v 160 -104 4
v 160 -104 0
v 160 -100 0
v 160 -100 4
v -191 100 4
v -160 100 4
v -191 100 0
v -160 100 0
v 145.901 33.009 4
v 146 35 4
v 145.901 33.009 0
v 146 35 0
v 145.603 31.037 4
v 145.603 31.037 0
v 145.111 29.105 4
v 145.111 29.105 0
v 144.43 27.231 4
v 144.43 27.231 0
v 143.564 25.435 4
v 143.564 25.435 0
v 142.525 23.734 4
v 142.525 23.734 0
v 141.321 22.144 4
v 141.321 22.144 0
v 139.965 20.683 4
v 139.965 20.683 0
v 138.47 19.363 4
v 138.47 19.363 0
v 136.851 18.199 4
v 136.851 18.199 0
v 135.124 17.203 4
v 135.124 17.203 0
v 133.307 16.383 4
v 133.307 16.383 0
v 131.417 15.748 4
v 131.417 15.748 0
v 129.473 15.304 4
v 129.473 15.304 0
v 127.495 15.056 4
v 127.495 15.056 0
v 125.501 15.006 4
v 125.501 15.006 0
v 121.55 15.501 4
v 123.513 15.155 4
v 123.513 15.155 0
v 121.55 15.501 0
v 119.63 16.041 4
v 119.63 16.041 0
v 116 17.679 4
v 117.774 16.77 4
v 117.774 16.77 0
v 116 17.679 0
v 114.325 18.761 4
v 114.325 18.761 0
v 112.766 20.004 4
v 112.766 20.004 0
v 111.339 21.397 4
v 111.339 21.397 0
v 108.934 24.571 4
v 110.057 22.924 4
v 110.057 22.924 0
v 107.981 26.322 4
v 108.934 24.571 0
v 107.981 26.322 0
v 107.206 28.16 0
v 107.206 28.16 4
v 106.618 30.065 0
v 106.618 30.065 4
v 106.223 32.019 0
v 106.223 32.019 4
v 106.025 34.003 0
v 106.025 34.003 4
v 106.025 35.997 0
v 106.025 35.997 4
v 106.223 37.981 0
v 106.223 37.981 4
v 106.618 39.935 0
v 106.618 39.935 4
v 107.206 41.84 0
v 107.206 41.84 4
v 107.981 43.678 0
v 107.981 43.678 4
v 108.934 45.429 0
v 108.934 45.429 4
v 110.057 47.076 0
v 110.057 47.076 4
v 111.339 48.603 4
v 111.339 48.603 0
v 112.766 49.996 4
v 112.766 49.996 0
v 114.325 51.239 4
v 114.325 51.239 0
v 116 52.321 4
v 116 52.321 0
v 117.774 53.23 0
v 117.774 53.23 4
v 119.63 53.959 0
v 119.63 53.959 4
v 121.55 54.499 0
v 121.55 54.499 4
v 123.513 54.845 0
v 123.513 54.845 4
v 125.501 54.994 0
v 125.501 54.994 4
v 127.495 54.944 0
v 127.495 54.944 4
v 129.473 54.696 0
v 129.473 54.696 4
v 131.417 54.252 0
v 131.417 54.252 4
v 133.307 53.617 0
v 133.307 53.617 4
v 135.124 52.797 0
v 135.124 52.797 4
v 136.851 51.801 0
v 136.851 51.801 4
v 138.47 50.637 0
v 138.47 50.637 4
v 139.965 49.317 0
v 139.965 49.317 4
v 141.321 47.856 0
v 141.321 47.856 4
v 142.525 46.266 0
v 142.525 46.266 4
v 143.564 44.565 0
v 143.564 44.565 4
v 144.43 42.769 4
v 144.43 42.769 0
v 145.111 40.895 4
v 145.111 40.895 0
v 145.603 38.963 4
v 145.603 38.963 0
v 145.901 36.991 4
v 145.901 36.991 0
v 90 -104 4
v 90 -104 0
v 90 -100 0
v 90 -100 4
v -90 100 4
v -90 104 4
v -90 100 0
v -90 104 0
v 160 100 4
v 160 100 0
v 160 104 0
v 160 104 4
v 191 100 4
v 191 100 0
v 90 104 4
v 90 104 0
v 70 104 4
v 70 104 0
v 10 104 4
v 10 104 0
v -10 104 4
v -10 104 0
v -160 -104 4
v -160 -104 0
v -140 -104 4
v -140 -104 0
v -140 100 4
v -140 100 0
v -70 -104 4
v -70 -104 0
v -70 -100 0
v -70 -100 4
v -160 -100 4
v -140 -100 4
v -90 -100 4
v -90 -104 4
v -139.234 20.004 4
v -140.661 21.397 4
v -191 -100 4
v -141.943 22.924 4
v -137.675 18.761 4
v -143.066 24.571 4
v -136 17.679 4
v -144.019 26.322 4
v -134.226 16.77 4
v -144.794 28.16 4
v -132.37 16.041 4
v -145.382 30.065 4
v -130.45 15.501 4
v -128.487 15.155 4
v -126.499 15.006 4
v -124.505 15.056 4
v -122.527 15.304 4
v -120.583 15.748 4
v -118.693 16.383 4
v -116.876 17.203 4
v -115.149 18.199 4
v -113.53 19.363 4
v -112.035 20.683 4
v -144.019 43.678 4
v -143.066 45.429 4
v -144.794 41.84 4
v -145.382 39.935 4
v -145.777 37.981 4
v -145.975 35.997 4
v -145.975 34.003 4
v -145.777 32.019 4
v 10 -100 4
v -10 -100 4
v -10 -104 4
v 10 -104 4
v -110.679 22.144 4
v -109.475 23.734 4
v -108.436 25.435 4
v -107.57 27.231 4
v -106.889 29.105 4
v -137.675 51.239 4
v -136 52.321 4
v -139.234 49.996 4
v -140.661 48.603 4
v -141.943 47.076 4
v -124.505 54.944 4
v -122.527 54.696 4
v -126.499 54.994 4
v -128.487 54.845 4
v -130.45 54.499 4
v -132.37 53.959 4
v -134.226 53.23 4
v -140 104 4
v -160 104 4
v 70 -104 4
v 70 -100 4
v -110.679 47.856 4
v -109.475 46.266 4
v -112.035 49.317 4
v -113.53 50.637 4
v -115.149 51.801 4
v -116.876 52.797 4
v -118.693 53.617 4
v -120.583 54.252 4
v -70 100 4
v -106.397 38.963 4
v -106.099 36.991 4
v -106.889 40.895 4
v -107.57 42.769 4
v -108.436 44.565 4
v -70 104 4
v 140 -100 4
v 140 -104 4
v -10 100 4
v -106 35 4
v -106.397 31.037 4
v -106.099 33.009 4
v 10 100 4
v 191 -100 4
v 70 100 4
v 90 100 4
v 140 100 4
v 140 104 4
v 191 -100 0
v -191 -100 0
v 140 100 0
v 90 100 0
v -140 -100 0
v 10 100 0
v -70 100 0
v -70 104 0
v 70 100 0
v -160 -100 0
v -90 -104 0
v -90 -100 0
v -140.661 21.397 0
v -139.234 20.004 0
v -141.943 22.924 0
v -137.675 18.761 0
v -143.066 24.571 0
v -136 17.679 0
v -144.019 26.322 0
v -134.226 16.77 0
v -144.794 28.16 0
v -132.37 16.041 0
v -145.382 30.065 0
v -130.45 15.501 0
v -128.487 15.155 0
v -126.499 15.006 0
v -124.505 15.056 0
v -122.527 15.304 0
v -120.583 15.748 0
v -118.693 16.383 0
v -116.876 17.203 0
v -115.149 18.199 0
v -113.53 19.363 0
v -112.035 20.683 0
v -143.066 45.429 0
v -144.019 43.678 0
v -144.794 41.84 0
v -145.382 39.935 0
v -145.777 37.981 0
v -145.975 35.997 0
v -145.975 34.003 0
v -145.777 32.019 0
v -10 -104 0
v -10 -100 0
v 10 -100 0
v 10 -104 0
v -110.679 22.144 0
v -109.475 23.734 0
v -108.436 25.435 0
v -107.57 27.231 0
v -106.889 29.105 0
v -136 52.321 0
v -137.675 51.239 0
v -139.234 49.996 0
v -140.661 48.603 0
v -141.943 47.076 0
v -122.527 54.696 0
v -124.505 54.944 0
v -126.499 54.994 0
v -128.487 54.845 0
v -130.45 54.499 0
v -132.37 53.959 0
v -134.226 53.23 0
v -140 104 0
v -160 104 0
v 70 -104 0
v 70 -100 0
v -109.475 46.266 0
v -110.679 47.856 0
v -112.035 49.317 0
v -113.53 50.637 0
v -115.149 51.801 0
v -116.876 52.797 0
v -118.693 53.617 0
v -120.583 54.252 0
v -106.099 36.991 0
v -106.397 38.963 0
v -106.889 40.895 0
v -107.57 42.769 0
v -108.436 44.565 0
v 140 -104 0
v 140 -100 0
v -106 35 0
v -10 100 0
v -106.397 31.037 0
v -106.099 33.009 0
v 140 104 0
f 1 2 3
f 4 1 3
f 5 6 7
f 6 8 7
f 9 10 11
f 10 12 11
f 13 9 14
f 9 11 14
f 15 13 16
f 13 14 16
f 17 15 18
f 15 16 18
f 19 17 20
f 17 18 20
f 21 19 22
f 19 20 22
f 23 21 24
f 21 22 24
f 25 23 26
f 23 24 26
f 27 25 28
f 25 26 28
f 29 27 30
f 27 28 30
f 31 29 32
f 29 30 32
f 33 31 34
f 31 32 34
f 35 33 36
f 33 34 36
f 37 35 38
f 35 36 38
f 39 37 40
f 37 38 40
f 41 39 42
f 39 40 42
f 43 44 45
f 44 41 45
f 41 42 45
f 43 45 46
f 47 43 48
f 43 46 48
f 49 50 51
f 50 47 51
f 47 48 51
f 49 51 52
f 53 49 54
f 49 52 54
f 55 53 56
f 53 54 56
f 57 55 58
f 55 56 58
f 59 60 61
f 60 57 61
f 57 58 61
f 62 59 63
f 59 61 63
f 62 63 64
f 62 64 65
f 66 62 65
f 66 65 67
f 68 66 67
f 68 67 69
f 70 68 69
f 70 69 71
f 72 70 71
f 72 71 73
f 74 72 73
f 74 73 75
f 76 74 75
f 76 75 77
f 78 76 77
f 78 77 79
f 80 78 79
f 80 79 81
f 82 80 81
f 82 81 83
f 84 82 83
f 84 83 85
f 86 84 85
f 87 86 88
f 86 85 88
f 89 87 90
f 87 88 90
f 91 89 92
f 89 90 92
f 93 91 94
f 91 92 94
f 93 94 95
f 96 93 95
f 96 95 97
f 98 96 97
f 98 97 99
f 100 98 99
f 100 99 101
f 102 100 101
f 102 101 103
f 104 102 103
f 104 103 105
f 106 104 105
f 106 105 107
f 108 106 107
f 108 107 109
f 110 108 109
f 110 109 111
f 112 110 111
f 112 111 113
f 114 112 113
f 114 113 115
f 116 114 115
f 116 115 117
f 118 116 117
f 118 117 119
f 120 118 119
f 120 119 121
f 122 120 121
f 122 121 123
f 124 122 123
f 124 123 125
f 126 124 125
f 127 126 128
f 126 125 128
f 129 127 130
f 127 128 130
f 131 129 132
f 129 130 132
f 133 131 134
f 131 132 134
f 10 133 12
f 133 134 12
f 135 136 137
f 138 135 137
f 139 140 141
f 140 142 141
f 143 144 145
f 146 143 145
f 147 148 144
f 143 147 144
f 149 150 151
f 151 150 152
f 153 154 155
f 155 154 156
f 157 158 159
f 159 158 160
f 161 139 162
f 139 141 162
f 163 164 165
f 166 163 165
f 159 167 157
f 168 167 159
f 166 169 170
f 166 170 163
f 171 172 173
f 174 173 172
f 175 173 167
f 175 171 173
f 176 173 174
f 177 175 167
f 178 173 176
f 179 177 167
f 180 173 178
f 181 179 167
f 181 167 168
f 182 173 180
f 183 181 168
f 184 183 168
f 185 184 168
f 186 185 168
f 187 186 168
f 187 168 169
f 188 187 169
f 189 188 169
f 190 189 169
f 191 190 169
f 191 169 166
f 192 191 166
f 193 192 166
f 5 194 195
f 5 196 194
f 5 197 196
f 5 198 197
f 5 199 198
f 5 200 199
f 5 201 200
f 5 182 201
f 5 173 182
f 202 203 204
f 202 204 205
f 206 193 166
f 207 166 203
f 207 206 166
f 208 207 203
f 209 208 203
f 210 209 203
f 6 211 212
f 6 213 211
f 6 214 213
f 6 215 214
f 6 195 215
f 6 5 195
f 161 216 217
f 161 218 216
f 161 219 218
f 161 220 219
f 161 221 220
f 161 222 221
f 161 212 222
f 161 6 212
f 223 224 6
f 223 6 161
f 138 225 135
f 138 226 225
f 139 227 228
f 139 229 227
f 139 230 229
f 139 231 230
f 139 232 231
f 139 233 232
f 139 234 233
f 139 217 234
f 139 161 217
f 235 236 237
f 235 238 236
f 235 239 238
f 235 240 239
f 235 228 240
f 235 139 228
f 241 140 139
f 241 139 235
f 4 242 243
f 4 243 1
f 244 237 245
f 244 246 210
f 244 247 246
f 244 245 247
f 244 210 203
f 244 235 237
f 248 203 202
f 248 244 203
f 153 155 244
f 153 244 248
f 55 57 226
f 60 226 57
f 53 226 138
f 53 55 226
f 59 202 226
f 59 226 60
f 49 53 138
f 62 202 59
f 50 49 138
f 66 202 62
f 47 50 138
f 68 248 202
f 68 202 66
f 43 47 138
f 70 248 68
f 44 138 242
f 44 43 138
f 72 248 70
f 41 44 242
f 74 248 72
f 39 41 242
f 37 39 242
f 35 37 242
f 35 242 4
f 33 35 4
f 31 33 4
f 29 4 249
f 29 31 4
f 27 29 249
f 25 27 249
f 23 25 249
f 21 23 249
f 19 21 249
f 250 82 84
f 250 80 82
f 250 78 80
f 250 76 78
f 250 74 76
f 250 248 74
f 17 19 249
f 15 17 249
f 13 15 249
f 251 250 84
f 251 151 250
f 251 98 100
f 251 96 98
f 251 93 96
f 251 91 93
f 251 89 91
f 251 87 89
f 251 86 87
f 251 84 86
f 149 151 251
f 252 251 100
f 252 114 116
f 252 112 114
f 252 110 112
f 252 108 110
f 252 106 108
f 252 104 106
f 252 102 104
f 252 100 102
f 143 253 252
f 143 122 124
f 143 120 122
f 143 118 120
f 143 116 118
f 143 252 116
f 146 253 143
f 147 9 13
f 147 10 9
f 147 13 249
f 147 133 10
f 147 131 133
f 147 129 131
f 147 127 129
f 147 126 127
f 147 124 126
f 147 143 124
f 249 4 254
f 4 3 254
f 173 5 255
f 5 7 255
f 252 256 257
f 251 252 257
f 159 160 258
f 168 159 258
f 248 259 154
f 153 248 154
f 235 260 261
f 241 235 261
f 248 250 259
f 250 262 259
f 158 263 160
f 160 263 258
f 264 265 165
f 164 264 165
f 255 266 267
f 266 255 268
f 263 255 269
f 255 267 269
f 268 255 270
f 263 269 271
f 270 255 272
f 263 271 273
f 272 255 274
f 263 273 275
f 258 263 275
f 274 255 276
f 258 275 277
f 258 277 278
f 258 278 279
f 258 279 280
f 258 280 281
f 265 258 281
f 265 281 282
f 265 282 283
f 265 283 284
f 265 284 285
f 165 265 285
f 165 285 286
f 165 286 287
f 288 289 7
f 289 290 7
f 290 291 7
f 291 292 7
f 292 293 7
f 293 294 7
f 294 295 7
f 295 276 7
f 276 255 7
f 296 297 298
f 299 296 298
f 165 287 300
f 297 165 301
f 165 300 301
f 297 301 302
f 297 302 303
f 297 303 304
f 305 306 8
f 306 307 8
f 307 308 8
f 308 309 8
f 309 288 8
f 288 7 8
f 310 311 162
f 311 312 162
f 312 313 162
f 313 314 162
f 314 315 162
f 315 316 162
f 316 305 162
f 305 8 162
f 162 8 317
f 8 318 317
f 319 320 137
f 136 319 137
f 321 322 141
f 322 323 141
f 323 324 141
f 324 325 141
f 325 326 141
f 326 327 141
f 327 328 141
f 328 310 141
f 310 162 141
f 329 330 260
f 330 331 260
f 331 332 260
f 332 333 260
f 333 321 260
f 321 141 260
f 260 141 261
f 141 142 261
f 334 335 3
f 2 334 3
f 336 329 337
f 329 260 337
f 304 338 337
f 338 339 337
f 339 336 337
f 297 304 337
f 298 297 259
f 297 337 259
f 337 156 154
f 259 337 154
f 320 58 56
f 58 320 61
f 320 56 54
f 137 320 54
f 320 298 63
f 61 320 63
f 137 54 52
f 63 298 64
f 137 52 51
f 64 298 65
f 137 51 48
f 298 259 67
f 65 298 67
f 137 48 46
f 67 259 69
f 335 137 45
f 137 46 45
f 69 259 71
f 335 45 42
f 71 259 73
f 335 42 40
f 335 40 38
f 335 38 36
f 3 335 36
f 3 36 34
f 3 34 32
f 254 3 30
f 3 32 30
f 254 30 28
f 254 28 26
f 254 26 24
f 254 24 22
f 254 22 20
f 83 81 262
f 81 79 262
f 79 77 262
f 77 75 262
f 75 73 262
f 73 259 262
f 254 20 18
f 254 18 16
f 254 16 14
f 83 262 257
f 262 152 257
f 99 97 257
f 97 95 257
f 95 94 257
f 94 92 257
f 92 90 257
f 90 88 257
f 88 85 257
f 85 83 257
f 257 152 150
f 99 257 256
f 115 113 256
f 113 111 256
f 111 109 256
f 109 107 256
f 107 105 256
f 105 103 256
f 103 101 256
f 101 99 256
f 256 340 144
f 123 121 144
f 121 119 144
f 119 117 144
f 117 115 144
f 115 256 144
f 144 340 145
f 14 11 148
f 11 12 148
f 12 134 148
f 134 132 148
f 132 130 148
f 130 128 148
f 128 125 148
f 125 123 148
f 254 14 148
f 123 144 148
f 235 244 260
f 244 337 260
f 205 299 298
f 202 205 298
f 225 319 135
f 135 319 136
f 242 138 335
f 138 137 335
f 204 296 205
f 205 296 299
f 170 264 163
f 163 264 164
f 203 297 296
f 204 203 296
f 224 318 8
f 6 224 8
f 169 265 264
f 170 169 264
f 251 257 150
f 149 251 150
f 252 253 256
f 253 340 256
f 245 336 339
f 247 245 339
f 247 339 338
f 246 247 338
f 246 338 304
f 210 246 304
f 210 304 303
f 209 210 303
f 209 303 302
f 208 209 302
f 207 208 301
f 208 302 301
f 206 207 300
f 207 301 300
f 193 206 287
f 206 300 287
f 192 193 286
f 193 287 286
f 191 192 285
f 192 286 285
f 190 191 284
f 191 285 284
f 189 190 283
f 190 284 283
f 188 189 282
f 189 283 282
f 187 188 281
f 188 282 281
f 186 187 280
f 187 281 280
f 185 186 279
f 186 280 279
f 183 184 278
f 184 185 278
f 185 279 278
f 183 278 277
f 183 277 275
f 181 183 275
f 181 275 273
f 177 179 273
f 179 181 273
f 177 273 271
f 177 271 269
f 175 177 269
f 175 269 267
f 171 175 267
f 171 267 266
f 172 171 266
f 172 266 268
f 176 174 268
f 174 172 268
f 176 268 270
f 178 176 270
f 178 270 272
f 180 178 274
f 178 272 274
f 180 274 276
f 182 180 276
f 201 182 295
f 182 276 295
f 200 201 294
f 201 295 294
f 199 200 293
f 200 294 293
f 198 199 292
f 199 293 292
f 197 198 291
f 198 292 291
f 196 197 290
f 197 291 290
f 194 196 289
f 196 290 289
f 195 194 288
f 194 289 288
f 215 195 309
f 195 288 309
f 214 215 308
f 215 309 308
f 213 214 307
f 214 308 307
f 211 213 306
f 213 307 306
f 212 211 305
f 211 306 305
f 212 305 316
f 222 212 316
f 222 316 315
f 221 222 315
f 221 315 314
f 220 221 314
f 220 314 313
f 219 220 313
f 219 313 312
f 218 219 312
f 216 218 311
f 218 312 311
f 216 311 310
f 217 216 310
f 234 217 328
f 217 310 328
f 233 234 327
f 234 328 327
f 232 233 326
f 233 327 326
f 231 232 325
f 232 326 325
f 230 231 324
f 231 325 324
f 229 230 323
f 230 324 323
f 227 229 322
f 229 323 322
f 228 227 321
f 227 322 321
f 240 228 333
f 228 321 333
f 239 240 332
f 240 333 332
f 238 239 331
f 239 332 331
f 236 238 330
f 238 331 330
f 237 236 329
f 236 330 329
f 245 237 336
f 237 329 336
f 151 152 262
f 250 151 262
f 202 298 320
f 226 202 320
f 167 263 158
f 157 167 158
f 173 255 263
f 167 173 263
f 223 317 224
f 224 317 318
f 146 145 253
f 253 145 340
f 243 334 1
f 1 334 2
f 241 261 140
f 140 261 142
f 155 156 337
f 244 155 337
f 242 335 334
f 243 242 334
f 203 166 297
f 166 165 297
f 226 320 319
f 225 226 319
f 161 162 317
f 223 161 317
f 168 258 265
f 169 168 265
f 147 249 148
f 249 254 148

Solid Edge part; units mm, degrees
sketch "Sketch1" plane through (0, 0, 0) normal (0, 0, 1) x (1, 0, 0)
  line L0 (-160, 104) -> (-160, 100)
  line L1 (-160, 100) -> (-191, 100)
  line L2 (-191, 100) -> (-191, -100)
  line L3 (-191, -100) -> (-160, -100)
  line L4 (-160, -100) -> (-160, -104)
  line L5 (-160, -104) -> (-140, -104)
  line L6 (-140, -104) -> (-140, -100)
  line L7 (-140, -100) -> (-90, -100)
  line L8 (-90, -100) -> (-90, -104)
  line L9 (-90, -104) -> (-70, -104)
  line L10 (-70, -104) -> (-70, -100)
  line L11 (-70, -100) -> (-10, -100)
  line L12 (-10, -100) -> (-10, -104)
  line L13 (-10, -104) -> (10, -104)
  line L14 (10, -104) -> (10, -100)
  line L15 (10, -100) -> (70, -100)
  line L16 (70, -100) -> (70, -104)
  line L17 (70, -104) -> (90, -104)
  line L18 (90, -104) -> (90, -100)
  line L19 (90, -100) -> (140, -100)
  line L20 (140, -100) -> (140, -104)
  line L21 (140, -104) -> (160, -104)
  line L22 (160, -104) -> (160, -100)
  line L23 (160, -100) -> (191, -100)
  line L24 (191, -100) -> (191, 100)
  line L25 (191, 100) -> (160, 100)
  line L26 (160, 100) -> (160, 104)
  line L27 (160, 104) -> (140, 104)
  line L28 (140, 104) -> (140, 100)
  line L29 (140, 100) -> (90, 100)
  line L30 (90, 100) -> (90, 104)
  line L31 (90, 104) -> (70, 104)
  line L32 (70, 104) -> (70, 100)
  line L33 (70, 100) -> (10, 100)
  line L34 (10, 100) -> (10, 104)
  line L35 (10, 104) -> (-10, 104)
  line L36 (-10, 104) -> (-10, 100)
  line L37 (-10, 100) -> (-70, 100)
  line L38 (-70, 100) -> (-70, 104)
  line L39 (-70, 104) -> (-90, 104)
  line L40 (-90, 104) -> (-90, 100)
  line L41 (-90, 100) -> (-140, 100)
  line L42 (-140, 100) -> (-140, 104)
  line L43 (-140, 104) -> (-160, 104)
  circle A0 centre (126, 35) radius 20
  circle A1 centre (-126, 35) radius 20
extrude "Protrusion1" add sketch "Sketch1" along normal blind 4
